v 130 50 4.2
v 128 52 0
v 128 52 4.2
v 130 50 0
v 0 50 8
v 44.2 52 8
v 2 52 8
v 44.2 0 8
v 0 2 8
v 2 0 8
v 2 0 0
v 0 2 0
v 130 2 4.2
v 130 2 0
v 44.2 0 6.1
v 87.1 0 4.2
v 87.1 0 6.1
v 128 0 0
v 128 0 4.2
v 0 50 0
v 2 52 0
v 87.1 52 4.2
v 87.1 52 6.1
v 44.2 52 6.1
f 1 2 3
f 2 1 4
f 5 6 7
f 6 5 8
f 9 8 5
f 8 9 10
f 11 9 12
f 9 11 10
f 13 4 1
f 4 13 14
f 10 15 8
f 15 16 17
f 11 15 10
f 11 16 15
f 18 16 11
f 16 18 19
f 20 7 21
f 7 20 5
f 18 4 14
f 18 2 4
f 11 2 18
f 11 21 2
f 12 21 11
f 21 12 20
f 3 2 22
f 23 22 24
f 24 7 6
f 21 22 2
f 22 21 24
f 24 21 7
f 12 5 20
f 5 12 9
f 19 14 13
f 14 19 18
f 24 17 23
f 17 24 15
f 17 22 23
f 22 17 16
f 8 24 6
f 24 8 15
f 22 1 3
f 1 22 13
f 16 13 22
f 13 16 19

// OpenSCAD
$fn = 32;

// ----------------------------------------------------------------------
// Stepped bar: twostep, 130 x 52 x 8/4.2 mm
// ----------------------------------------------------------------------

// --- parameters (mm) ---
bar_l = 130;              // bar length, X
bar_w = 52;               // bar width, Y
plate_t = 8;              // thickness of the thick zone, Z
thin_t = 4.2;             // thickness of the thin zone
corner_c = 2;             // corner chamfer of the bar
step_cut = 3.8;           // material removed from the thin zone
stair1_x = 44.2;          // position of the first stair
stair2_x = 87.1;          // position of the second stair
mid_t = 6.1;              // thickness of the middle zone
depth_1 = 1.9;            // depth of cut 1 from the top face
depth_2 = 3.8;            // depth of cut 2 from the top face

profile = [[2, 0], [128, 0], [130, 2], [130, 50], [128, 52], [2, 52], [0, 50], [0, 2]];  // primary outline, 8 points, counter clockwise
void_1 = [[44.2, -1], [87.1, -1], [87.1, 53], [44.2, 53]];  // first stair, 4 points
void_2 = [[87.1, -1], [131, -1], [131, 53], [87.1, 53]];  // second stair, 4 points

// --- the one profile operation ---
difference() {
  linear_extrude(height = plate_t) polygon(points = profile);
  translate([0, 0, plate_t - depth_1])
    linear_extrude(height = depth_1 + 1) polygon(points = void_1);
  translate([0, 0, plate_t - depth_2])
    linear_extrude(height = depth_2 + 1) polygon(points = void_2);
}
